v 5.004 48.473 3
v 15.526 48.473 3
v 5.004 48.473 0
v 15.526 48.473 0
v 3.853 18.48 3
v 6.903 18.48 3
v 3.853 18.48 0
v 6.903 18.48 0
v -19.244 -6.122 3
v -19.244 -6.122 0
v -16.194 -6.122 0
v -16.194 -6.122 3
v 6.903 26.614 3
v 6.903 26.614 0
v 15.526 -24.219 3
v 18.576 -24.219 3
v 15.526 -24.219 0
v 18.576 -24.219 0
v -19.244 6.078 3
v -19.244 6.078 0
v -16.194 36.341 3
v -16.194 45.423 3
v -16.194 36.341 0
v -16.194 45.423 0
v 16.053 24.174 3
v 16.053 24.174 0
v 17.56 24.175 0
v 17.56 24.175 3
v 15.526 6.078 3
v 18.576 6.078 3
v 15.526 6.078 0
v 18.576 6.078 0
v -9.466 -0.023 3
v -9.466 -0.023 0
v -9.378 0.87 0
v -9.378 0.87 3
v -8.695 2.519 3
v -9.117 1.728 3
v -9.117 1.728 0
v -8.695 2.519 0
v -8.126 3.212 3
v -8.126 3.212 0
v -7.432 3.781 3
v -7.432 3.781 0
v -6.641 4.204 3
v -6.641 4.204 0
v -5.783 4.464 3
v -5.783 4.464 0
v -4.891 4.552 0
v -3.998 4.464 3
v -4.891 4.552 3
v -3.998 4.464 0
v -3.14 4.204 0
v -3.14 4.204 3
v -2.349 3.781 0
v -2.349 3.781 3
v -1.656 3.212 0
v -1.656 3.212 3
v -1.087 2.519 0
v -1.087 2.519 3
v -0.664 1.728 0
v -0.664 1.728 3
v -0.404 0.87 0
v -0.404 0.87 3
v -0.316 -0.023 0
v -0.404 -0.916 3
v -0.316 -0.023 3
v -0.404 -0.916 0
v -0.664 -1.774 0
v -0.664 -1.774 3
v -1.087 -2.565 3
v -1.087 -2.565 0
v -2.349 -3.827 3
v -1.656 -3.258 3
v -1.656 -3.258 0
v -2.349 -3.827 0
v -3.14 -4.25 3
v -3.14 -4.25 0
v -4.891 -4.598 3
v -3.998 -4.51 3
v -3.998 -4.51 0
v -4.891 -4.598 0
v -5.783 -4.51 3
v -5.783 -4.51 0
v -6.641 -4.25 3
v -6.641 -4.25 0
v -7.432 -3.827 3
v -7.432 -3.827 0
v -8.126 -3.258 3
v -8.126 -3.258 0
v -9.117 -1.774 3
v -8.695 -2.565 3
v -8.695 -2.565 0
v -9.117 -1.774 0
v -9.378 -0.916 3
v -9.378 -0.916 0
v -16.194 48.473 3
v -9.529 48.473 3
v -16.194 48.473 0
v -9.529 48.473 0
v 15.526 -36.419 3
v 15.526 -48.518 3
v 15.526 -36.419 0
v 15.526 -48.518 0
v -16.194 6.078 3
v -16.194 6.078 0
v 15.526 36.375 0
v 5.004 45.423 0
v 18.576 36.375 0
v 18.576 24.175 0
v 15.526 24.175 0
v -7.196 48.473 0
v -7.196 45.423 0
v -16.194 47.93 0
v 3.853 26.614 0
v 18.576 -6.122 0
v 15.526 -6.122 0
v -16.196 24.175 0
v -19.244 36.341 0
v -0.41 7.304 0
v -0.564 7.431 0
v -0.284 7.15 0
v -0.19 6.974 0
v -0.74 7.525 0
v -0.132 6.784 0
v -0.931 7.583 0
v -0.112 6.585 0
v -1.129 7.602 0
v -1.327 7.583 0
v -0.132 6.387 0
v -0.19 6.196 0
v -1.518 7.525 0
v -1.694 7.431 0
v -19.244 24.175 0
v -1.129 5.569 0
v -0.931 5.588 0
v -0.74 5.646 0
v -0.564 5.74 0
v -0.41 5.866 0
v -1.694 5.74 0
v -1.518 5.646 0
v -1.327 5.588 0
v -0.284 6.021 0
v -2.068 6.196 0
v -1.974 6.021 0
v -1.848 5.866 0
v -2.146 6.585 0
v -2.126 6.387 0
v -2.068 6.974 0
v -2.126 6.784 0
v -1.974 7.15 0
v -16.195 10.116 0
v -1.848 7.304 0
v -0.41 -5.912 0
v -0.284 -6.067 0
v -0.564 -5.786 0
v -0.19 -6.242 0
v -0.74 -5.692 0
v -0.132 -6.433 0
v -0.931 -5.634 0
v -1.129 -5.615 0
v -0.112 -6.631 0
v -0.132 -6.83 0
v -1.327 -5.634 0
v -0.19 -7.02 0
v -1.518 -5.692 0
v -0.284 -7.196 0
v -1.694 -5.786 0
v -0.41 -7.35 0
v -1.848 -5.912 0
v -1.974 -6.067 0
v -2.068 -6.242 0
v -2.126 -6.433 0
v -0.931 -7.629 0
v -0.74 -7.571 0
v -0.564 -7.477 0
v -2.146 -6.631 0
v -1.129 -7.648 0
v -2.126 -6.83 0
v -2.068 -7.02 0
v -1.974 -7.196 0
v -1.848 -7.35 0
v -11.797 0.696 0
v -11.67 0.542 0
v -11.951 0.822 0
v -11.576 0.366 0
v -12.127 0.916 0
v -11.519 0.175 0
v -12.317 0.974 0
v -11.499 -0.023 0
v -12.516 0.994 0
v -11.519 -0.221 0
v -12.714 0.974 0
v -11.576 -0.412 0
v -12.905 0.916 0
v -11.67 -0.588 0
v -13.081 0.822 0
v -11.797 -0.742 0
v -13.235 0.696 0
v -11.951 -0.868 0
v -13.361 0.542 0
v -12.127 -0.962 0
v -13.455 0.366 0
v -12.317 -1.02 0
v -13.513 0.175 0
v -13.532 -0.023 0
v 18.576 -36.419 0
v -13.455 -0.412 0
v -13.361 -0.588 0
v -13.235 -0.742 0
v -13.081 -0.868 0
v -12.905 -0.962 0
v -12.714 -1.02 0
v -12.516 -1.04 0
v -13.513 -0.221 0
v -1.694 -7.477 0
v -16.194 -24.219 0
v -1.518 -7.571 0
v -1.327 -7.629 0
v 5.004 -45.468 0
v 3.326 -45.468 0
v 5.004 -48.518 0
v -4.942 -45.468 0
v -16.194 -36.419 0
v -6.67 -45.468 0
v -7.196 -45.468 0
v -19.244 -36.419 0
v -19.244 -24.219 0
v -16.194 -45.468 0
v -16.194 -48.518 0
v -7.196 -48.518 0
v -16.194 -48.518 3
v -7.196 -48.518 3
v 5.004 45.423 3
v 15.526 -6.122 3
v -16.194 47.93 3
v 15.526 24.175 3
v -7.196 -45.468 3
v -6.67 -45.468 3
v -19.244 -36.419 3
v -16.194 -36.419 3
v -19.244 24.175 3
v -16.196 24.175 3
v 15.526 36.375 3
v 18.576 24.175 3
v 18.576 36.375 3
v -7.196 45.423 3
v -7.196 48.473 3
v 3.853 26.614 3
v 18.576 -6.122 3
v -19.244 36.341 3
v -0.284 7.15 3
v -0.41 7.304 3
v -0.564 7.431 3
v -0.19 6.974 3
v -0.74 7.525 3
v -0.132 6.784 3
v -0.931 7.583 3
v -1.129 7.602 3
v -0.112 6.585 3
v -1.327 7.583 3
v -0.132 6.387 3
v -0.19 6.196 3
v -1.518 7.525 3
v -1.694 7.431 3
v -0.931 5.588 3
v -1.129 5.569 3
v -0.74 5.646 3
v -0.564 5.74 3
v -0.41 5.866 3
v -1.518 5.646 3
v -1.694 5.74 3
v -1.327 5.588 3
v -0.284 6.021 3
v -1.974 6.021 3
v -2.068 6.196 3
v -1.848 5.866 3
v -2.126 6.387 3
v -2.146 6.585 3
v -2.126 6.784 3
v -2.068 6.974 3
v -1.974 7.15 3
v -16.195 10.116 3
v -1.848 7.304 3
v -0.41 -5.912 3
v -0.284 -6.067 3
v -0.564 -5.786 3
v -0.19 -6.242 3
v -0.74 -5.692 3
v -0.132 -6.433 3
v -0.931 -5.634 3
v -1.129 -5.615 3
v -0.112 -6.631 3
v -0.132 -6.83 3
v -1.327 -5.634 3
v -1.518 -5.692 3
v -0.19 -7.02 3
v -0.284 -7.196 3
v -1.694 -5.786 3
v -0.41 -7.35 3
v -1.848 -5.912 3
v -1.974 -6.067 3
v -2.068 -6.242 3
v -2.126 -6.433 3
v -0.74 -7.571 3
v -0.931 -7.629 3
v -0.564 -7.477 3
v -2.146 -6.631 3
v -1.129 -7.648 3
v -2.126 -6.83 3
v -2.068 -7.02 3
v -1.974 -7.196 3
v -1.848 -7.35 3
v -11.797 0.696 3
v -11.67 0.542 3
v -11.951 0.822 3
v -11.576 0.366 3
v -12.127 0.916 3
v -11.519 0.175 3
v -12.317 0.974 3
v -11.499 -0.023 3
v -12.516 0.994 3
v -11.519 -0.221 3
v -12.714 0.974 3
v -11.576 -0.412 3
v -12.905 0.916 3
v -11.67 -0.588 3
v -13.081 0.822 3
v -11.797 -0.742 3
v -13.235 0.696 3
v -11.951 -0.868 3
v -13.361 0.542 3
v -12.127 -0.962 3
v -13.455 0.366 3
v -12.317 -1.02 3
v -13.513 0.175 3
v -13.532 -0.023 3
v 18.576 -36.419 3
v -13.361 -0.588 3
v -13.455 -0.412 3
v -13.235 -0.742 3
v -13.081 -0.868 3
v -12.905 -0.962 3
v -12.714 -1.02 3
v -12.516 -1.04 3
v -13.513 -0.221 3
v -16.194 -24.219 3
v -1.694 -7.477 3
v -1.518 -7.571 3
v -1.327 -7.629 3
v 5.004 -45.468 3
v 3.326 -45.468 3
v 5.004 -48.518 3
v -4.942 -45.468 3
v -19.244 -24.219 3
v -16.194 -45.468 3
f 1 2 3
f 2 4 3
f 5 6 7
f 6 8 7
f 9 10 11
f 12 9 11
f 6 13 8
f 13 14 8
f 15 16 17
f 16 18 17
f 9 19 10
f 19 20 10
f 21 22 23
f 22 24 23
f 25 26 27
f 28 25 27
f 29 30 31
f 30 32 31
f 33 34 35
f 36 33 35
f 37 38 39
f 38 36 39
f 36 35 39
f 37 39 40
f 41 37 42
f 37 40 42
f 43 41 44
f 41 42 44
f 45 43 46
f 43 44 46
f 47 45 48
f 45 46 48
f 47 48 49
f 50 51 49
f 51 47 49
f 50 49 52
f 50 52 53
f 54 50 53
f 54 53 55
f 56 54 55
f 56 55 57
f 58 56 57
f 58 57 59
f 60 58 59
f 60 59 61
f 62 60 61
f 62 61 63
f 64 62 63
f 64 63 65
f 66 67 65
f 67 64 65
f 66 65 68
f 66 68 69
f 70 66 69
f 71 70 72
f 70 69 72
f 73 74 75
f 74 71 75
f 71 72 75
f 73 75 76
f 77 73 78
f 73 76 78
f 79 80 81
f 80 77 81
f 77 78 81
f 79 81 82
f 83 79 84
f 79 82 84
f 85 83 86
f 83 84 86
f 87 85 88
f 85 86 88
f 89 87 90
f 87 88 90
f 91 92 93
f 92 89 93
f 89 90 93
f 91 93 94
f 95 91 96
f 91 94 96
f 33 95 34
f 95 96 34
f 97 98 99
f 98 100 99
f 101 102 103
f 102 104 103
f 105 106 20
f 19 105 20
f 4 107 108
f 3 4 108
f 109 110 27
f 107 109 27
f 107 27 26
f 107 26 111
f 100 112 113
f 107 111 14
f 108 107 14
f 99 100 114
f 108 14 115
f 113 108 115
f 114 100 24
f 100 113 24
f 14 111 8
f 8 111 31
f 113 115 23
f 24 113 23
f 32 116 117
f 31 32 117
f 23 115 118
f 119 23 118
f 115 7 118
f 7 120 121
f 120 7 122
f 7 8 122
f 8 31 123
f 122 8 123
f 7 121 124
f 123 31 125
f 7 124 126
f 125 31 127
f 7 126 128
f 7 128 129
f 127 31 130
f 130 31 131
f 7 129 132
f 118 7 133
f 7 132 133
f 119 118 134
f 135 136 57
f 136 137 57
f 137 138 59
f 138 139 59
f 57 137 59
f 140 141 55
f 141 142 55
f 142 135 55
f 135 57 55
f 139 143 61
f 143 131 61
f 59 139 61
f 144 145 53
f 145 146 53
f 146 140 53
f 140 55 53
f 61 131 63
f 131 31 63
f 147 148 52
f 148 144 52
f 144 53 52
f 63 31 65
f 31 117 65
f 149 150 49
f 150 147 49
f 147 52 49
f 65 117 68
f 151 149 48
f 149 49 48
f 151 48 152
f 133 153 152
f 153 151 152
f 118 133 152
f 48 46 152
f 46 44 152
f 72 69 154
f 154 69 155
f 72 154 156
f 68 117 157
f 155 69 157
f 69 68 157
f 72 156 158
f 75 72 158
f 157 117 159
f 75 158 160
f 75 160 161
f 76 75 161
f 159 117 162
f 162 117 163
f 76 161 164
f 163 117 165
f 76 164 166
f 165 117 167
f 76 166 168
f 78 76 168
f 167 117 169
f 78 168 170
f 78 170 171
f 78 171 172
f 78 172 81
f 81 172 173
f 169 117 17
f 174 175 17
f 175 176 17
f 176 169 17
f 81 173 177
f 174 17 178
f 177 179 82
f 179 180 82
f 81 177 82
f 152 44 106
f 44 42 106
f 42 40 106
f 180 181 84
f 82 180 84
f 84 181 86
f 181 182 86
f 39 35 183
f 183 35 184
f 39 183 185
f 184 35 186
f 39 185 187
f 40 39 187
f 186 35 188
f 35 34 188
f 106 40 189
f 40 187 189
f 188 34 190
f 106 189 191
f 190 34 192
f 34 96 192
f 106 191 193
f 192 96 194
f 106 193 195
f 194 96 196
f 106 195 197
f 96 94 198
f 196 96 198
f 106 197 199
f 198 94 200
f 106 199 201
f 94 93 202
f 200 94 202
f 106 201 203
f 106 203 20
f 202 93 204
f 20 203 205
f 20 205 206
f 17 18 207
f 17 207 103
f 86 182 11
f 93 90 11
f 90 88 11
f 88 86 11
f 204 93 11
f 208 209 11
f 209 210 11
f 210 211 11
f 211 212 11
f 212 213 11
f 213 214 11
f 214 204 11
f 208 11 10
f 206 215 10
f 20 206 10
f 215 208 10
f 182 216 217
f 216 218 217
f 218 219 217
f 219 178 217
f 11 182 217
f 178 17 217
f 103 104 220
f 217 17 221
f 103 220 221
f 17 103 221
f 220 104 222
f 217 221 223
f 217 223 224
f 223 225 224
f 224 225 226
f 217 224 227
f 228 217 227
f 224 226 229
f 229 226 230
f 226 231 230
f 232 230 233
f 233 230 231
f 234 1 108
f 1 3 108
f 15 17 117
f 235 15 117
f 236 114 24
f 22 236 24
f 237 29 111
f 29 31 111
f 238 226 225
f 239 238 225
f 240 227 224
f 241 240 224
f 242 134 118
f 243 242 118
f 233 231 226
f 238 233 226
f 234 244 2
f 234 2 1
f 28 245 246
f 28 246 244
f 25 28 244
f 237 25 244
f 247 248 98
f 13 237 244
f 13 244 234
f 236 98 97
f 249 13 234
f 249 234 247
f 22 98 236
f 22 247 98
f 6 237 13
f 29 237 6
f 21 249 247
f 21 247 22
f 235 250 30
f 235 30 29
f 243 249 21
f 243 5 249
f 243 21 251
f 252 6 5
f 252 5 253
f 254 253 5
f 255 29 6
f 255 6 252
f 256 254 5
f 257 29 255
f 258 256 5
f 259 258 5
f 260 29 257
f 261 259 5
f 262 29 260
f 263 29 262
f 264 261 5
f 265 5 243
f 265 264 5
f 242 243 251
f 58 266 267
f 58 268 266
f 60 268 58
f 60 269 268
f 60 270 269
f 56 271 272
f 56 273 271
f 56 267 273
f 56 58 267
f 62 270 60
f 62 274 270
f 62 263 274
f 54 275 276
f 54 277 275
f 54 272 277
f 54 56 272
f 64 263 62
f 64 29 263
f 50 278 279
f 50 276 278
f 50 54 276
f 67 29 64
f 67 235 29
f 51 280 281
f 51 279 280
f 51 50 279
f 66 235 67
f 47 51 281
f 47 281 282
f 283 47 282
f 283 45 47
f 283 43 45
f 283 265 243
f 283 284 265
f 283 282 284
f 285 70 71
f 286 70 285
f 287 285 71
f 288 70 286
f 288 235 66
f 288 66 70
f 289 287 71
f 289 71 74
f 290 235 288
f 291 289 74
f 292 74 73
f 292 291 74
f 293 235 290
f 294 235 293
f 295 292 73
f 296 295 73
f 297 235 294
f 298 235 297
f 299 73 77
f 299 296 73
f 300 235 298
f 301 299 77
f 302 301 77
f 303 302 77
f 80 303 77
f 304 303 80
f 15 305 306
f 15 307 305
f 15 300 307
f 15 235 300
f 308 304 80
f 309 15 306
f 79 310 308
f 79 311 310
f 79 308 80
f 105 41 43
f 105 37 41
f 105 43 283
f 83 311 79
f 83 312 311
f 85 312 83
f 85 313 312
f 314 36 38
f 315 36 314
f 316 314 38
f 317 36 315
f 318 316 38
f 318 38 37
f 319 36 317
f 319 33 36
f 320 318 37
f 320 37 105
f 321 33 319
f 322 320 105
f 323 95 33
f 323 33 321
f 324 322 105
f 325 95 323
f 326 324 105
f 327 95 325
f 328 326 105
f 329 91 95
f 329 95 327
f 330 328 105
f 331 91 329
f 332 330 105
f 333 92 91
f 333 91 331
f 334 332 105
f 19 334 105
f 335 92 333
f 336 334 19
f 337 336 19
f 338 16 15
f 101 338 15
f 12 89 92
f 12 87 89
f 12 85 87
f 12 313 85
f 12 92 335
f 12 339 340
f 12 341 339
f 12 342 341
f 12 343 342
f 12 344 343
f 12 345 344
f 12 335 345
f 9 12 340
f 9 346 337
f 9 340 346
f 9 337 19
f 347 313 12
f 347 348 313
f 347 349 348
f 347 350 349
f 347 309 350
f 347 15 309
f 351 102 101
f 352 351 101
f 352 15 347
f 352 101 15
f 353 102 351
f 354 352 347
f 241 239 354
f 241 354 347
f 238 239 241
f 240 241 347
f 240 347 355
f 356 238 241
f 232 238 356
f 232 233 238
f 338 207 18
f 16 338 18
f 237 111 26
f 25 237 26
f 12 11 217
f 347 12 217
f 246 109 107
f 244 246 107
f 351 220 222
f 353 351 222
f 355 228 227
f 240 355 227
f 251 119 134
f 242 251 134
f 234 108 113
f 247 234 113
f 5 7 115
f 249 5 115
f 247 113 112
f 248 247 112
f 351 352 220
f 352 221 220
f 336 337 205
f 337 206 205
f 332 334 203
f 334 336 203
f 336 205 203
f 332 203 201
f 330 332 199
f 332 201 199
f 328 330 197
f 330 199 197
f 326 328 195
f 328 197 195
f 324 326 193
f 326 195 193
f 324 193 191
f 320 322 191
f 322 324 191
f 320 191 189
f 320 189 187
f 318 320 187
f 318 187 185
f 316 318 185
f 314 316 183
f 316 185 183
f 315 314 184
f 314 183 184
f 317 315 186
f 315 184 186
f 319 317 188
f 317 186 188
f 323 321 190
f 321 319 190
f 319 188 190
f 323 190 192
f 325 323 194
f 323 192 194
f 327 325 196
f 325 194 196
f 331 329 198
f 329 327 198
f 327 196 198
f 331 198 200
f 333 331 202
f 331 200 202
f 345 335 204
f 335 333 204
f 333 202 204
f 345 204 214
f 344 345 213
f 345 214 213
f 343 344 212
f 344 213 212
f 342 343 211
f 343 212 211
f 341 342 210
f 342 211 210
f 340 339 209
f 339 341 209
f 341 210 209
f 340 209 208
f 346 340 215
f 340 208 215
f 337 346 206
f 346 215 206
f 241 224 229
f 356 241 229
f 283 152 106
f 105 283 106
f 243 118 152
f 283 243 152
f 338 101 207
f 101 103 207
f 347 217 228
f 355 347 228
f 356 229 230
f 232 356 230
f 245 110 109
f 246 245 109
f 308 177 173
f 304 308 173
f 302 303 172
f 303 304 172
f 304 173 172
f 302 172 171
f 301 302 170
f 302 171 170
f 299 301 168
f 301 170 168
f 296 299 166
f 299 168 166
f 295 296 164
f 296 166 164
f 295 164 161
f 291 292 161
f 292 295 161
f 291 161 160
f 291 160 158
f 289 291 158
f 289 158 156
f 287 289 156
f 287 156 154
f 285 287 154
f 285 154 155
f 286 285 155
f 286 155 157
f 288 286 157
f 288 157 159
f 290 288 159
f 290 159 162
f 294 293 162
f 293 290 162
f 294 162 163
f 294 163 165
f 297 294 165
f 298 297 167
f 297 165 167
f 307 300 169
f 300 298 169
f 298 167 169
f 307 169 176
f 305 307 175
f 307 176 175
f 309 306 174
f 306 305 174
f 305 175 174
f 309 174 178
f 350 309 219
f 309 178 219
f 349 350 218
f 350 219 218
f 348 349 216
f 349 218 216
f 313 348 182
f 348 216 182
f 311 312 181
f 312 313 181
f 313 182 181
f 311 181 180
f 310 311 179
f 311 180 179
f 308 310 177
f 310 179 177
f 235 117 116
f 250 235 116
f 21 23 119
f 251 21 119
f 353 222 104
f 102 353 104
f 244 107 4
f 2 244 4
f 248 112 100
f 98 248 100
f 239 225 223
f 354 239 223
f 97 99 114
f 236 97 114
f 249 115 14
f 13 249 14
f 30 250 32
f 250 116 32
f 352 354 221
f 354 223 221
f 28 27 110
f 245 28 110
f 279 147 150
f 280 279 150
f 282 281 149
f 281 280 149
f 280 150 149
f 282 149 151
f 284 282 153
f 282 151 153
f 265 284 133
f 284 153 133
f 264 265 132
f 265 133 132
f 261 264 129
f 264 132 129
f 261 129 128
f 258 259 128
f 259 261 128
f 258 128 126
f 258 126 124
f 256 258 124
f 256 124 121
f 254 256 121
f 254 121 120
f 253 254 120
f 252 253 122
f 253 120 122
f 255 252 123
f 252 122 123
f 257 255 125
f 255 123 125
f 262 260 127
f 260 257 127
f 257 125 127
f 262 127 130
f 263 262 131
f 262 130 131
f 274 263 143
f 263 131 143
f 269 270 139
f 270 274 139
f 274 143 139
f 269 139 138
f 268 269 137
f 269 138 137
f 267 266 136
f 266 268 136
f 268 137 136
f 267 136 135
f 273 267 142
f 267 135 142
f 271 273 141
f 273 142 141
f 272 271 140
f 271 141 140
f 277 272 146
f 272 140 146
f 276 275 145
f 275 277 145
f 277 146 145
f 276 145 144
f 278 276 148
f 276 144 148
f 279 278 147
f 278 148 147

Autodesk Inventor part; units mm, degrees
ref_plane "YZ Plane" through (0, 0, 0) normal (1, 0, 0) x (0, 1, 0)
ref_plane "XZ Plane" through (0, 0, 0) normal (0, 1, 0) x (-1, 0, 0)
ref_plane "XY Plane" through (0, 0, 0) normal (0, 0, 1) x (1, 0, 0)
sketch "Boceto1" plane through (0, 0, 0) normal (0, 0, 1) x (-1, 0, 0)
  line L0 (-18.5763, -36.3749) -> (-15.5263, -36.3749)
  line L1 (-15.5263, -36.3749) -> (-15.5263, -48.4733)
  line L2 (-15.5263, -48.4733) -> (-5.0037, -48.4733)
  line L3 (-5.0037, -48.4733) -> (-5.0037, -45.4233)
  line L4 (-5.0037, -45.4233) -> (7.1965, -45.4233)
  line L5 (7.1965, -45.4233) -> (7.1965, -48.4733)
  line L6 (7.1965, -48.4733) -> (9.5287, -48.4733)
  line L7 (9.5287, -48.4733) -> (16.194, -48.4733)
  line L8 (16.194, -48.4733) -> (16.194, -47.9303)
  line L9 (16.194, -47.9303) -> (16.194, -45.4233)
  line L10 (16.194, -45.4233) -> (16.194, -36.3411)
  line L11 (16.194, -36.3411) -> (19.2441, -36.3411)
  line L12 (19.2441, -36.3411) -> (19.2441, -24.1748)
  line L13 (19.2444, -24.1748) -> (16.1963, -24.1748)
  line L14 (16.1963, -24.1748) -> (16.1954, -10.116)
  line L15 (16.1954, -10.116) -> (16.194, -6.0779)
  line L16 (16.1918, -6.1454) -> (16.194, -6.0779)
  line L17 (16.194, -6.0779) -> (19.2441, -6.0779)
  line L18 (19.2441, -6.0779) -> (19.2441, 6.1222)
  line L19 (19.2441, 6.1222) -> (16.194, 6.1222)
  line L20 (16.194, 6.1222) -> (16.194, 24.2191)
  line L21 (16.194, 24.2191) -> (19.2441, 24.2191)
  line L22 (19.2441, 24.2191) -> (19.2441, 36.4192)
  line L23 (19.2441, 36.4192) -> (16.194, 36.4192)
  line L24 (16.194, 36.4192) -> (16.194, 45.4676)
  line L25 (16.194, 45.4676) -> (16.194, 48.5176)
  line L26 (16.194, 48.5176) -> (7.1965, 48.5176)
  line L27 (7.1965, 48.5176) -> (7.1965, 45.4676)
  line L28 (7.1965, 45.4676) -> (-3.3262, 45.4676)
  line L29 (-3.3262, 45.4676) -> (-5.0037, 45.4676)
  line L30 (-5.0037, 45.4676) -> (-5.0037, 48.5176)
  line L31 (-5.0037, 48.5176) -> (-15.5263, 48.5176)
  line L32 (-15.5263, 48.5176) -> (-15.5263, 36.4192)
  line L33 (-15.5263, 36.4192) -> (-18.5763, 36.4192)
  line L34 (-18.5763, 36.4192) -> (-18.5763, 24.2191)
  line L35 (-18.5763, 24.2191) -> (-15.5263, 24.2191)
  line L36 (-15.5263, 24.2191) -> (-15.5263, 6.1222)
  line L37 (-15.5263, 6.1222) -> (-18.5763, 6.1222)
  line L38 (-18.5763, 6.1222) -> (-18.5763, -6.0779)
  line L39 (-18.5763, -6.0779) -> (-15.5263, -6.0779)
  line L40 (-15.5263, -6.0779) -> (-15.5263, -24.1748)
  line L41 (-15.5263, -24.1748) -> (-17.5596, -24.1748)
  line L42 (-17.5596, -24.1748) -> (-18.5763, -24.1748)
  line L43 (-18.5763, -24.1748) -> (-18.5763, -36.3749)
  line L44 (-16.0528, -24.1739) -> (-19.1028, -24.1739)
  line L45 (6.6699, 45.4684) -> (4.9416, 45.4684)
  line L46 (-3.8527, -18.4805) -> (-3.8527, -26.614)
  line L47 (-3.8527, -26.614) -> (-6.9027, -26.614)
  line L48 (-6.9027, -26.614) -> (-6.9027, -18.4805)
  line L49 (-6.9027, -18.4805) -> (-3.8527, -18.4805)
  circle A0 centre (1.129, 6.6314) radius 1.0167
  circle A1 centre (4.8907, 0.023) radius 4.575
  circle A2 centre (12.5158, 0.023) radius 1.0167
  circle A3 centre (1.129, -6.5854) radius 1.0167
  point P0 (0, 0)
  dimension "d2" = 96.991
  dimension "d3" = 37.82
extrude "Extrusión1" add sketch "Boceto1" along normal blind 3
properties part number "costat3"
